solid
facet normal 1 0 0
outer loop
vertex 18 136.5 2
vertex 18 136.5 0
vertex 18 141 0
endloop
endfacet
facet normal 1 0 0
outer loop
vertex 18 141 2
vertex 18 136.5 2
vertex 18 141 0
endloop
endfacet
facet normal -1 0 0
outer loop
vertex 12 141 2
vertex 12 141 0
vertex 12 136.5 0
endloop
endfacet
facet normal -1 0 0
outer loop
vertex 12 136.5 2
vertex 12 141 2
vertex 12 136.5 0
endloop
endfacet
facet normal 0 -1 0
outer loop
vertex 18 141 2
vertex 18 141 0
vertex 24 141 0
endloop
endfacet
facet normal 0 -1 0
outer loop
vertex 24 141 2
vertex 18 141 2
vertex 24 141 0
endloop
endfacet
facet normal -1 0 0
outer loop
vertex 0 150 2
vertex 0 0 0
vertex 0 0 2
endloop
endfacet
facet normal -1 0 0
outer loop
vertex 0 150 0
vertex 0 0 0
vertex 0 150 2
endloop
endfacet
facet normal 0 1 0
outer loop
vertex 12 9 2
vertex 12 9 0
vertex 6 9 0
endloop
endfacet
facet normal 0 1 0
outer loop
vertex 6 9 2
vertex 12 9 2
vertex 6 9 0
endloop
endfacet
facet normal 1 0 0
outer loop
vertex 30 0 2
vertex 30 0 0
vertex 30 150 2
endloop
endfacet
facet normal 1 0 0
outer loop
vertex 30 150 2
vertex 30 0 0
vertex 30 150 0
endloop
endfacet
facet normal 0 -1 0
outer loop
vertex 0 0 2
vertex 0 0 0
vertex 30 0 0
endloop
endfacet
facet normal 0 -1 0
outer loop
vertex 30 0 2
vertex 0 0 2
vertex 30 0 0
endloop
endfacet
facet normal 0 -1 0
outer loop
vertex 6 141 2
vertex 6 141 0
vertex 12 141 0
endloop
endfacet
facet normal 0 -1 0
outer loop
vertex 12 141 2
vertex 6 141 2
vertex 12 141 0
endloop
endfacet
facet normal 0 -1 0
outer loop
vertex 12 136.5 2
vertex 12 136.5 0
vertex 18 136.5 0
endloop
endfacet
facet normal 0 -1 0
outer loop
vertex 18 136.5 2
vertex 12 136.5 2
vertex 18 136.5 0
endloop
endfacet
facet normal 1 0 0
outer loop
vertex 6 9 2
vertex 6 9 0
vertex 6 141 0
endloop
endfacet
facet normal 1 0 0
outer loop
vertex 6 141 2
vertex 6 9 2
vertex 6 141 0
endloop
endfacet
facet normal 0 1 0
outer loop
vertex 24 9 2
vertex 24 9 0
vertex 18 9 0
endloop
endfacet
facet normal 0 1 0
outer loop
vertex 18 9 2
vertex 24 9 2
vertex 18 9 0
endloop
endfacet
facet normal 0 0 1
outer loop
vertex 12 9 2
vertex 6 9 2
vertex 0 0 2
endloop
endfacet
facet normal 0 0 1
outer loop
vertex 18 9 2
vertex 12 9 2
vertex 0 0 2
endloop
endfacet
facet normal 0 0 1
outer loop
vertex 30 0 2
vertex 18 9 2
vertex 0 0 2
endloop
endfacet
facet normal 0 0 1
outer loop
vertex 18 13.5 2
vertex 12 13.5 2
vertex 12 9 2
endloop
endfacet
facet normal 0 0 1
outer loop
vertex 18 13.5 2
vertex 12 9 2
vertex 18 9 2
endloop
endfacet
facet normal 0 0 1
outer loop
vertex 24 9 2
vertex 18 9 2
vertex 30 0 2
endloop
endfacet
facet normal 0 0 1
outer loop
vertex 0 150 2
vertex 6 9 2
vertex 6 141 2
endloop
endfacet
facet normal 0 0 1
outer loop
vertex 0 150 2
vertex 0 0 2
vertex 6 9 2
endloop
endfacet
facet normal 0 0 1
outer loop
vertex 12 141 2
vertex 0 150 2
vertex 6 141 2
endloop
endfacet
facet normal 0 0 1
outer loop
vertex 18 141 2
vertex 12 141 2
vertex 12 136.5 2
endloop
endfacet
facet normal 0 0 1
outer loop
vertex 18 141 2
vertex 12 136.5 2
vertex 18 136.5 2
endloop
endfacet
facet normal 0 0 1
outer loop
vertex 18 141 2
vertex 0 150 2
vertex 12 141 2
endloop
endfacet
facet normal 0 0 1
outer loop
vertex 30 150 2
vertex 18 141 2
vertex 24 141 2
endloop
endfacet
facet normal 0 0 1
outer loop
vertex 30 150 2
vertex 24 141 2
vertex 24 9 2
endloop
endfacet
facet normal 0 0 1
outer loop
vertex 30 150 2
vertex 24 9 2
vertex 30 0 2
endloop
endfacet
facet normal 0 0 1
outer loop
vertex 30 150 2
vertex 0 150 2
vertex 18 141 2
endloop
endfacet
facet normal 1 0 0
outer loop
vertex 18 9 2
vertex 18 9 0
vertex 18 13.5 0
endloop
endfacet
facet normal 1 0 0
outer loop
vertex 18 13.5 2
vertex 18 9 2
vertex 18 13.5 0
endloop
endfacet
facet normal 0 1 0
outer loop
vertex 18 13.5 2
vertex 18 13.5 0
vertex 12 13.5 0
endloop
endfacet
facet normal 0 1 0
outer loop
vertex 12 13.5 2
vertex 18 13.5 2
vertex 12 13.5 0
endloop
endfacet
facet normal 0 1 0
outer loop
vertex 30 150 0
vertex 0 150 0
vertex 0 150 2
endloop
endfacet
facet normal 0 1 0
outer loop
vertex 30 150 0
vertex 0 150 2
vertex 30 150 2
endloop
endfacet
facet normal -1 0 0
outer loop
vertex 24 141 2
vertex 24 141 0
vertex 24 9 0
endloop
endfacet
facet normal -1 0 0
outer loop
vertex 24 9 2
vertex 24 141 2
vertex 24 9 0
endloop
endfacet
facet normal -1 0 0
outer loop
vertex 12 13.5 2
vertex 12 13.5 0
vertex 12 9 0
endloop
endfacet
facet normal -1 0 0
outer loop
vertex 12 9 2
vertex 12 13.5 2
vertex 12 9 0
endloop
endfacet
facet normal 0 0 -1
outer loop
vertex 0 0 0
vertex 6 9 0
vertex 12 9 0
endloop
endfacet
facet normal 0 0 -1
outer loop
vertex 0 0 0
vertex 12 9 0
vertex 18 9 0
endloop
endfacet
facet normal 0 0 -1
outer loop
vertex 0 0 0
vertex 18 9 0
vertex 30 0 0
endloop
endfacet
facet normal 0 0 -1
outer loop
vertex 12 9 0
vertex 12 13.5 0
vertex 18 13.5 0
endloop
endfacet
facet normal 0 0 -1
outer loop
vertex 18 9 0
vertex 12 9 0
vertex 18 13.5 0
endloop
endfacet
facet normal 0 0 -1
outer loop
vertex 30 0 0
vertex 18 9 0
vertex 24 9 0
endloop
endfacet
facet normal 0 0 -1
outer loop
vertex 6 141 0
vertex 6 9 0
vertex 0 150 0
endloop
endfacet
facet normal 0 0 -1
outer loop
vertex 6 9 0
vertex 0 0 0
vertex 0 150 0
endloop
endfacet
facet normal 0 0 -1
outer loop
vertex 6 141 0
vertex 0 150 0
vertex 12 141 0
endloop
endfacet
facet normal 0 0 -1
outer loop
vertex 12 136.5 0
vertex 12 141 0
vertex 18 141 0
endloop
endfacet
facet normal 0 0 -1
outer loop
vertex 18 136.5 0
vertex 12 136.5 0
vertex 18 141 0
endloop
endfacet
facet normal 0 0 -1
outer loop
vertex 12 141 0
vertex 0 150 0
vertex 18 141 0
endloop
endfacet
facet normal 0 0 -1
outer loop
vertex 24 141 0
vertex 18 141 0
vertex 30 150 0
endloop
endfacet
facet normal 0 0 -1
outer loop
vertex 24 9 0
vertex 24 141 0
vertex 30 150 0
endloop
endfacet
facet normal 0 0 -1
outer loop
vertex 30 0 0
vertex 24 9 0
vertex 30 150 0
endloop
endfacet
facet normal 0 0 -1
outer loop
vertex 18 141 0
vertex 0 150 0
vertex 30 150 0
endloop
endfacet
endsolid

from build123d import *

# Parameters (mm, degrees)
F0_W     = 30
F0_H     = 150
F1_DEPTH = 2


with BuildPart() as f1:
    # F0 (on Top) → F1 (new body)
    with BuildSketch(Plane.XY):
        with Locations((15, 75)):
            Rectangle(F0_W, F0_H)
        Polygon((6, 9), (6, 141), (12, 141), (12, 136.5), (18, 136.5), (18, 141), (24, 141), (24, 9), (18, 9), (18, 13.5), (12, 13.5), (12, 9), align=None, mode=Mode.SUBTRACT)
    extrude(amount=F1_DEPTH)


solid = f1.part
